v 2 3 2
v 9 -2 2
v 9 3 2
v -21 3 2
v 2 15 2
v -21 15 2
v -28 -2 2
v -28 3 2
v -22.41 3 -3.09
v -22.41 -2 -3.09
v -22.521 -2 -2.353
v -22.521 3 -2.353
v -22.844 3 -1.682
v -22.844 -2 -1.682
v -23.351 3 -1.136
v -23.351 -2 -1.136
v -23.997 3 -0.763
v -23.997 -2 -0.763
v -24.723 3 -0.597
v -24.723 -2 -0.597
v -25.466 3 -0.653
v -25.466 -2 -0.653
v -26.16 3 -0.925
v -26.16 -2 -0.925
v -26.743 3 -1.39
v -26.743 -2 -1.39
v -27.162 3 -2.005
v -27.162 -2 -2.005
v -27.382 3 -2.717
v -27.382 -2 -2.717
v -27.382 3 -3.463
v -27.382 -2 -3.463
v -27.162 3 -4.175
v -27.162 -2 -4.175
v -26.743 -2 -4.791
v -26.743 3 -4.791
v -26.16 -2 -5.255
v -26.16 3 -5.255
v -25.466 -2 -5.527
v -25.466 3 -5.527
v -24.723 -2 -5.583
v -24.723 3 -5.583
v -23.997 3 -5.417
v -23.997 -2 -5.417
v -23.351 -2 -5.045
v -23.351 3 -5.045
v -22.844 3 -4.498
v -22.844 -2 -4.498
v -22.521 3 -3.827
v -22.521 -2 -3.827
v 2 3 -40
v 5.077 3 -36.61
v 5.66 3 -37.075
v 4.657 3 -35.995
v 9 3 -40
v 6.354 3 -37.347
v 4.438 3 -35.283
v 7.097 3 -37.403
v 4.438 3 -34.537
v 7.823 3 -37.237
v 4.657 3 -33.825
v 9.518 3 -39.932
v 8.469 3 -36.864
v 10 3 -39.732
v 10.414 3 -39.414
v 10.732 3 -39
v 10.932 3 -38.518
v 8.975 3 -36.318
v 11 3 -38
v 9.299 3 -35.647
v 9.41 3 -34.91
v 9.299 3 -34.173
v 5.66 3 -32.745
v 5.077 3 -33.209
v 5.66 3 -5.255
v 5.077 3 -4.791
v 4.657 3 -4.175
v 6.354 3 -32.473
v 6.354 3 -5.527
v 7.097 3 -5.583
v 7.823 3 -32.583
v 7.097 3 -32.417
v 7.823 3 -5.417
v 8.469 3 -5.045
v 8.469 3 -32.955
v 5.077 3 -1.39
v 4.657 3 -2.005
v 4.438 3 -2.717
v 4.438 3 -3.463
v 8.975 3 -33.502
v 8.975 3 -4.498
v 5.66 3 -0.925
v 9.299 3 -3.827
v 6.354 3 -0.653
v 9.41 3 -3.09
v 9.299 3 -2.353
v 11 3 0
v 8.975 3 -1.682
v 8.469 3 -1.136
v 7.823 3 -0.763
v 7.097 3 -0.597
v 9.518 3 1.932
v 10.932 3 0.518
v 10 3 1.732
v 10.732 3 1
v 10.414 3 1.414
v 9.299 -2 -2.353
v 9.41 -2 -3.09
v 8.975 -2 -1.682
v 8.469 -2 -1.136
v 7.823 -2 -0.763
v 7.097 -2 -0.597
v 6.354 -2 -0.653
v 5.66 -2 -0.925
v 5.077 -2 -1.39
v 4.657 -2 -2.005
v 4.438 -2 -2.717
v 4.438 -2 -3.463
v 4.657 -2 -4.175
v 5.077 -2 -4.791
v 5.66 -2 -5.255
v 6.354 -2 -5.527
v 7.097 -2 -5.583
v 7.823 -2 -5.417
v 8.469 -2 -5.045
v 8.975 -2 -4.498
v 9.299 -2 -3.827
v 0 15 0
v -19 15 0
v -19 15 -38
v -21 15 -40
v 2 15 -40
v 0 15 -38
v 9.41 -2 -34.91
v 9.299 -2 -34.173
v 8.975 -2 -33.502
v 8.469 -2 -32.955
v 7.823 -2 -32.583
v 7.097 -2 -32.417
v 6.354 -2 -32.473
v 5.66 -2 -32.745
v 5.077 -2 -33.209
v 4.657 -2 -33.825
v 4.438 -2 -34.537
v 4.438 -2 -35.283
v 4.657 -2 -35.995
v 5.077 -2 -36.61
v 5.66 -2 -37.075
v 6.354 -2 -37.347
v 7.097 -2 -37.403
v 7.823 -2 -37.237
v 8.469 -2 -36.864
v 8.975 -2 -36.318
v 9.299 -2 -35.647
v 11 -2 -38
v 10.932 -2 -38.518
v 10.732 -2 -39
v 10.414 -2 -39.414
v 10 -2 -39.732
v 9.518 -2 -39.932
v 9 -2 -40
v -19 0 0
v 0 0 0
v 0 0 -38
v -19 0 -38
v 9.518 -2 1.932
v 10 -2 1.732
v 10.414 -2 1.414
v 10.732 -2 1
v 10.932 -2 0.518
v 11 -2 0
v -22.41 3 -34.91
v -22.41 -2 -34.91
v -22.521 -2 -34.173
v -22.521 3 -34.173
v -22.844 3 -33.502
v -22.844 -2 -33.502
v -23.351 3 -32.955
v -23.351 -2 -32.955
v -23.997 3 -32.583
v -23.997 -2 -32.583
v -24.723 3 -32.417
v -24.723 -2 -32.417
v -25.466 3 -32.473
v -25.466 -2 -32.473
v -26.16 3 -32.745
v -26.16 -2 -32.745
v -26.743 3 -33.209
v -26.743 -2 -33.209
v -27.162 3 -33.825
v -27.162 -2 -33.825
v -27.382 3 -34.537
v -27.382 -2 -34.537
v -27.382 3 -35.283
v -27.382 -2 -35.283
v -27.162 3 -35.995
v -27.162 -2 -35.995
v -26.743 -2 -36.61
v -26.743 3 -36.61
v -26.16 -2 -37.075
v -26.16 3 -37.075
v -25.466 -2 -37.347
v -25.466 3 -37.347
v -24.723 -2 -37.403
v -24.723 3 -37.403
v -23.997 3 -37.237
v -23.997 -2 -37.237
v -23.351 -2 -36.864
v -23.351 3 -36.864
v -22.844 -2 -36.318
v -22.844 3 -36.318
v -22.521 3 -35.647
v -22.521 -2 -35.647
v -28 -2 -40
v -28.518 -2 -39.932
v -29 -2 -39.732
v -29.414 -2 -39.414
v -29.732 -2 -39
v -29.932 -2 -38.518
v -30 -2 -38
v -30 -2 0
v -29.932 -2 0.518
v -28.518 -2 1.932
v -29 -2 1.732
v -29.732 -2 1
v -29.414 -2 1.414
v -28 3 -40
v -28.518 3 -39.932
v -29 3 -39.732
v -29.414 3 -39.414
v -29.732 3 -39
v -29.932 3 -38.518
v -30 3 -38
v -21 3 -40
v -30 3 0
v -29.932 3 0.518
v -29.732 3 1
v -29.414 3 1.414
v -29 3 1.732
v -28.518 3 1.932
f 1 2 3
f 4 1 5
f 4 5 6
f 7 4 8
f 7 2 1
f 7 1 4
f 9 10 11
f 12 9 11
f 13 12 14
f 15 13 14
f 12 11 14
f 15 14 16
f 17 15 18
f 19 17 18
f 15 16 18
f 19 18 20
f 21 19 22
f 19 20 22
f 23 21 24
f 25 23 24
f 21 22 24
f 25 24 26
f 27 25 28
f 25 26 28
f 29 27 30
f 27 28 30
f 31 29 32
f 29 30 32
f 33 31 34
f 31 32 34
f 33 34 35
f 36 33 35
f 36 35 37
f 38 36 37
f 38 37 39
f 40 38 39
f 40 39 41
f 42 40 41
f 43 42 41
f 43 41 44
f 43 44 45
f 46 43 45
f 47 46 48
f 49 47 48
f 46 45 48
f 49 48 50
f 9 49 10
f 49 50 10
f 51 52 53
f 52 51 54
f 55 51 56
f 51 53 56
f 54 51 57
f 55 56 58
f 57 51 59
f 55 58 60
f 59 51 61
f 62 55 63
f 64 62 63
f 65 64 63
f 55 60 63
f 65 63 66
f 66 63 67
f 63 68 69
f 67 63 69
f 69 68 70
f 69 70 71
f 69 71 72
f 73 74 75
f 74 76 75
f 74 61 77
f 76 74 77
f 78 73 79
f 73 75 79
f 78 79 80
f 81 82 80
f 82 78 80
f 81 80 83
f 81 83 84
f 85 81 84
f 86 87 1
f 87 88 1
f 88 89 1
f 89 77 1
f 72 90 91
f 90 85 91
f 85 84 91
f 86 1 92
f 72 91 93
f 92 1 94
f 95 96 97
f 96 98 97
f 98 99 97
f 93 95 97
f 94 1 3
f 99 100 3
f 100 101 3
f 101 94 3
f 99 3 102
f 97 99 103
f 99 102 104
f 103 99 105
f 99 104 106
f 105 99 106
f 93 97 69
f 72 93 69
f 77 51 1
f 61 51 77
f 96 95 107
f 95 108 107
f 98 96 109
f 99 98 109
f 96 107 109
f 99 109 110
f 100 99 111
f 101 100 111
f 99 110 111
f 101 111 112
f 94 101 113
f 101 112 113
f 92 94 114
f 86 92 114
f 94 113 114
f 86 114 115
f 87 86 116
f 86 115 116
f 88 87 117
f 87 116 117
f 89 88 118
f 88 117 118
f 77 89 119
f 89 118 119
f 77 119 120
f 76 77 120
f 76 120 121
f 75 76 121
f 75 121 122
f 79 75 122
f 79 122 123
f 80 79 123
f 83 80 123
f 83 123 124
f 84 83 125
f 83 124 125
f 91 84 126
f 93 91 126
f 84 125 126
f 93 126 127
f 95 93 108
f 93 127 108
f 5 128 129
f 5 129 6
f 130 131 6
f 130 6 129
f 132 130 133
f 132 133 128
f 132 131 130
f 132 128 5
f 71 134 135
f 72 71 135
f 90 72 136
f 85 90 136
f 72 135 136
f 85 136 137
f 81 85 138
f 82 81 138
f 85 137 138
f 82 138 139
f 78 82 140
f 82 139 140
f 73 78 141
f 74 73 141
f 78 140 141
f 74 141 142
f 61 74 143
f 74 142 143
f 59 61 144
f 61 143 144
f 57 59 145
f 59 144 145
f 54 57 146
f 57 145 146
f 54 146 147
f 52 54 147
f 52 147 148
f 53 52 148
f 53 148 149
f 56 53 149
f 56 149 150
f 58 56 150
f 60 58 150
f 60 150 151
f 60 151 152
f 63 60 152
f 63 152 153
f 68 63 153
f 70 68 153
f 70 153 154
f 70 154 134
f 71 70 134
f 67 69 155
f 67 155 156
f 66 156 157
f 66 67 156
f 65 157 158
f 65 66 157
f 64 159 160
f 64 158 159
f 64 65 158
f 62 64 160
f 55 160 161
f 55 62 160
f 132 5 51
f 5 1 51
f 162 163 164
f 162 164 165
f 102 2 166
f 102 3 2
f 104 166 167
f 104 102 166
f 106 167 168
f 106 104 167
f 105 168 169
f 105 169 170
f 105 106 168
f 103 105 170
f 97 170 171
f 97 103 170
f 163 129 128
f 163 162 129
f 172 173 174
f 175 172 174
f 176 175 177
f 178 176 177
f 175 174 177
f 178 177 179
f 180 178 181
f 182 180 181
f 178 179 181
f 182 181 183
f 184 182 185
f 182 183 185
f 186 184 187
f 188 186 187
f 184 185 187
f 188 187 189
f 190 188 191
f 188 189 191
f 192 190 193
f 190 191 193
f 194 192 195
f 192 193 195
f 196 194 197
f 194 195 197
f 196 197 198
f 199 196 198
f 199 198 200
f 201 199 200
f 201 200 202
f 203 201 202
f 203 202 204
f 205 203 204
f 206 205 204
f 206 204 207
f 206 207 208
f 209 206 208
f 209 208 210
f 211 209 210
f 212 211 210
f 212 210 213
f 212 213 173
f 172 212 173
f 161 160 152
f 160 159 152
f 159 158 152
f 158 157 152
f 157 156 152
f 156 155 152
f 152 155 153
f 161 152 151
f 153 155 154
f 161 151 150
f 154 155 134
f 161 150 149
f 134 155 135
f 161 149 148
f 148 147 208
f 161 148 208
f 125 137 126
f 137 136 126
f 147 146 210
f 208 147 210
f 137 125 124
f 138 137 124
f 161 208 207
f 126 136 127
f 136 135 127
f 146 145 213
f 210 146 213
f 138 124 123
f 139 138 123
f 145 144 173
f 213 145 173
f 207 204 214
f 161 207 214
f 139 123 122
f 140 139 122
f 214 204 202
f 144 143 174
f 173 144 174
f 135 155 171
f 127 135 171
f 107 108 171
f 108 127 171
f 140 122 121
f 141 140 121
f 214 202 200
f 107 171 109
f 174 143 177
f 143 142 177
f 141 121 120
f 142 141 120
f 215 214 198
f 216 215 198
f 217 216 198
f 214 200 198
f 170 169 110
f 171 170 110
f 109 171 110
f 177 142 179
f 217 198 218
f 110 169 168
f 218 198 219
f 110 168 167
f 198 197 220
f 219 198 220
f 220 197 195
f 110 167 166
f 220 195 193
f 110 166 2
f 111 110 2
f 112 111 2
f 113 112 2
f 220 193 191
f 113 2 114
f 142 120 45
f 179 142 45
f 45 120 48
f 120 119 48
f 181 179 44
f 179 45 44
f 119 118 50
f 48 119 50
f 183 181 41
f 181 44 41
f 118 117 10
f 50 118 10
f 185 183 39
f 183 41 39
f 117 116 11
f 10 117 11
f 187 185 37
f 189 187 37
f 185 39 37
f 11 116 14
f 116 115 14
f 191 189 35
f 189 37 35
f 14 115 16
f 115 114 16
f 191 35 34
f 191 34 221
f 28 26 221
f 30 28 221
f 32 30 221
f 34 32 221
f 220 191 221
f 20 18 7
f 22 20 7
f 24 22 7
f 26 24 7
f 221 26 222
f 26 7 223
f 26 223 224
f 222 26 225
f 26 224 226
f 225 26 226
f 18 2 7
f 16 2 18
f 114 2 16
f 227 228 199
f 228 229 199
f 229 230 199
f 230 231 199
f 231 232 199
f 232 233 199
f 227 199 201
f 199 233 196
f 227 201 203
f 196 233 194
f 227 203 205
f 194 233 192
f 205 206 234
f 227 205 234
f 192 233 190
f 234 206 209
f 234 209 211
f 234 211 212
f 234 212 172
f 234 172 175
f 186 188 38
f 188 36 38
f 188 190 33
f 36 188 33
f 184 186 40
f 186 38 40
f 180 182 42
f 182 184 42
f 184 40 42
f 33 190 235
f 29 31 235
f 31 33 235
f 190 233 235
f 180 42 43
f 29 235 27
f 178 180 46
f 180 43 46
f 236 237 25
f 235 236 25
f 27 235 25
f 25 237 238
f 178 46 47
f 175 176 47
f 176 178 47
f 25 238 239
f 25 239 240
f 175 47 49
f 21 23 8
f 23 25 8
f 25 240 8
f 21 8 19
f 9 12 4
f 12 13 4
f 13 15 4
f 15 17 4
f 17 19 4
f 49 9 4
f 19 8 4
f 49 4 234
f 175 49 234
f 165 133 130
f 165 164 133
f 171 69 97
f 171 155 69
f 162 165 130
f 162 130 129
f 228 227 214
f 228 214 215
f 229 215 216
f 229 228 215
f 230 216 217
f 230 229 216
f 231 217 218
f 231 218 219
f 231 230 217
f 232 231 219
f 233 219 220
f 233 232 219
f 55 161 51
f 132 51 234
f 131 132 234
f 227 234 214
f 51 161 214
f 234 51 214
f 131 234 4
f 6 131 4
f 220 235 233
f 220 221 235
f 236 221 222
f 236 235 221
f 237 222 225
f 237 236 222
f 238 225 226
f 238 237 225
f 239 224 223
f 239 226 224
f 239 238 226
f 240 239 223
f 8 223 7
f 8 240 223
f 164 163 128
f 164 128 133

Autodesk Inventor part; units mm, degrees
ref_plane "YZ Plane" through (0, 0, 0) normal (1, 0, 0) x (0, 1, 0)
ref_plane "XZ Plane" through (0, 0, 0) normal (0, 1, 0) x (-1, 0, 0)
ref_plane "XY Plane" through (0, 0, 0) normal (0, 0, 1) x (1, 0, 0)
sketch "Sketch1" plane through (0, 0, 0) normal (0, 1, 0) x (-1, 0, 0)
  line L0 (19, 0) -> (0, 0)
  line L1 (0, 0) -> (0, -38)
  line L2 (0, -38) -> (19, -38)
  line L3 (19, -38) -> (19, 0)
  line L4 (21, 2) -> (-2, 2)
  line L5 (-2, 2) -> (-2, -40)
  line L6 (-2, -40) -> (21, -40)
  line L7 (21, -40) -> (21, 2)
  dimension "d0" = 19
  dimension "d1" = 38
  dimension "d2" = 90
  dimension "d3" = 90
  dimension "d9" = 42
  dimension "d10" = 2
  dimension "d11" = 2
  dimension "d12" = 2
  dimension "d30" = 22
extrude "Extrusion1" add sketch "Sketch1" against normal blind 2 contours L3 L2 L1 L0 | L7 L6 L5 L4
sketch "Sketch2" plane through (0, 0, 0) normal (0, 1, 0) x (1, 0, 0)
  line L0 (0, 0) -> (0, 38)
  line L1 (0, 38) -> (-19, 38)
  line L2 (-19, 38) -> (-19, 0)
  line L3 (-19, 0) -> (0, 0)
  line L4 (-21, 40) -> (-21, -2) projected
  line L5 (2, 40) -> (-21, 40) projected
  line L6 (2, -2) -> (-21, -2) projected
  line L7 (-21, -2) -> (2, -2)
  line L8 (2, -2) -> (2, 40)
  line L9 (2, 40) -> (-21, 40)
  point P0 (2, 40)
  dimension "d15" = 2
  dimension "d16" = 2
  dimension "d17" = 90
extrude "Extrusion2" add sketch "Sketch2" along normal blind 15
sketch "Sketch3" plane through (0, -2, 0) normal (0, -1, 0) x (1, 0, 0)
  circle A0 centre (-9, -19) radius 22.5 construction
  circle A1 centre (-24.9099, -3.0901) radius 2.5
  circle A2 centre (6.9099, -34.9099) radius 2.5
  line L0 (-24.9099, -3.0901) -> (6.9099, -34.9099) construction
  circle A3 centre (6.9099, -3.0901) radius 2.5
  line L1 (-24.9099, -34.9099) -> (6.9099, -3.0901) construction
  circle A4 centre (-24.9099, -34.9099) radius 2.5
  line L2 (-9, 3.5) -> (-9, -41.5) construction
  line L3 (2, -40) -> (2, 2) projected
  line L4 (-21, -40) -> (2, -40) projected
  line L5 (-21, 2) -> (-30, 2)
  line L6 (-30, 2) -> (-30, -40)
  line L7 (-30, -40) -> (-21, -40)
  line L8 (2, -40) -> (11, -40)
  line L9 (11, -40) -> (11, 2)
  line L10 (11, 2) -> (2, 2)
  line L11 (-21, 2) -> (-21, -40)
  point P0 (0, 0)
  point P1 (-9, -19)
  point P2 (-9, -19)
  dimension "d20" = 45
  dimension "d21" = 5
  dimension "d22" = 5
  dimension "d23" = 45
  dimension "d24" = 5
  dimension "d25" = 5
  dimension "d26" = 45
  dimension "d27" = 90
  dimension "d28" = 45
  dimension "d29" = 11
  dimension "d31" = 21
  dimension "d32" = 0
  dimension "d33" = 9
  dimension "d34" = 42
  dimension "d35" = 9
extrude "Extrusion3" add sketch "Sketch3" against normal blind 5
fillet "Fillet1" radius 2 4 edges at (11, 0.5, 2) (11, 0.5, -40) (-30, 0.5, -40) (-30, 0.5, 2)
properties part number "Teenscy Holder"
